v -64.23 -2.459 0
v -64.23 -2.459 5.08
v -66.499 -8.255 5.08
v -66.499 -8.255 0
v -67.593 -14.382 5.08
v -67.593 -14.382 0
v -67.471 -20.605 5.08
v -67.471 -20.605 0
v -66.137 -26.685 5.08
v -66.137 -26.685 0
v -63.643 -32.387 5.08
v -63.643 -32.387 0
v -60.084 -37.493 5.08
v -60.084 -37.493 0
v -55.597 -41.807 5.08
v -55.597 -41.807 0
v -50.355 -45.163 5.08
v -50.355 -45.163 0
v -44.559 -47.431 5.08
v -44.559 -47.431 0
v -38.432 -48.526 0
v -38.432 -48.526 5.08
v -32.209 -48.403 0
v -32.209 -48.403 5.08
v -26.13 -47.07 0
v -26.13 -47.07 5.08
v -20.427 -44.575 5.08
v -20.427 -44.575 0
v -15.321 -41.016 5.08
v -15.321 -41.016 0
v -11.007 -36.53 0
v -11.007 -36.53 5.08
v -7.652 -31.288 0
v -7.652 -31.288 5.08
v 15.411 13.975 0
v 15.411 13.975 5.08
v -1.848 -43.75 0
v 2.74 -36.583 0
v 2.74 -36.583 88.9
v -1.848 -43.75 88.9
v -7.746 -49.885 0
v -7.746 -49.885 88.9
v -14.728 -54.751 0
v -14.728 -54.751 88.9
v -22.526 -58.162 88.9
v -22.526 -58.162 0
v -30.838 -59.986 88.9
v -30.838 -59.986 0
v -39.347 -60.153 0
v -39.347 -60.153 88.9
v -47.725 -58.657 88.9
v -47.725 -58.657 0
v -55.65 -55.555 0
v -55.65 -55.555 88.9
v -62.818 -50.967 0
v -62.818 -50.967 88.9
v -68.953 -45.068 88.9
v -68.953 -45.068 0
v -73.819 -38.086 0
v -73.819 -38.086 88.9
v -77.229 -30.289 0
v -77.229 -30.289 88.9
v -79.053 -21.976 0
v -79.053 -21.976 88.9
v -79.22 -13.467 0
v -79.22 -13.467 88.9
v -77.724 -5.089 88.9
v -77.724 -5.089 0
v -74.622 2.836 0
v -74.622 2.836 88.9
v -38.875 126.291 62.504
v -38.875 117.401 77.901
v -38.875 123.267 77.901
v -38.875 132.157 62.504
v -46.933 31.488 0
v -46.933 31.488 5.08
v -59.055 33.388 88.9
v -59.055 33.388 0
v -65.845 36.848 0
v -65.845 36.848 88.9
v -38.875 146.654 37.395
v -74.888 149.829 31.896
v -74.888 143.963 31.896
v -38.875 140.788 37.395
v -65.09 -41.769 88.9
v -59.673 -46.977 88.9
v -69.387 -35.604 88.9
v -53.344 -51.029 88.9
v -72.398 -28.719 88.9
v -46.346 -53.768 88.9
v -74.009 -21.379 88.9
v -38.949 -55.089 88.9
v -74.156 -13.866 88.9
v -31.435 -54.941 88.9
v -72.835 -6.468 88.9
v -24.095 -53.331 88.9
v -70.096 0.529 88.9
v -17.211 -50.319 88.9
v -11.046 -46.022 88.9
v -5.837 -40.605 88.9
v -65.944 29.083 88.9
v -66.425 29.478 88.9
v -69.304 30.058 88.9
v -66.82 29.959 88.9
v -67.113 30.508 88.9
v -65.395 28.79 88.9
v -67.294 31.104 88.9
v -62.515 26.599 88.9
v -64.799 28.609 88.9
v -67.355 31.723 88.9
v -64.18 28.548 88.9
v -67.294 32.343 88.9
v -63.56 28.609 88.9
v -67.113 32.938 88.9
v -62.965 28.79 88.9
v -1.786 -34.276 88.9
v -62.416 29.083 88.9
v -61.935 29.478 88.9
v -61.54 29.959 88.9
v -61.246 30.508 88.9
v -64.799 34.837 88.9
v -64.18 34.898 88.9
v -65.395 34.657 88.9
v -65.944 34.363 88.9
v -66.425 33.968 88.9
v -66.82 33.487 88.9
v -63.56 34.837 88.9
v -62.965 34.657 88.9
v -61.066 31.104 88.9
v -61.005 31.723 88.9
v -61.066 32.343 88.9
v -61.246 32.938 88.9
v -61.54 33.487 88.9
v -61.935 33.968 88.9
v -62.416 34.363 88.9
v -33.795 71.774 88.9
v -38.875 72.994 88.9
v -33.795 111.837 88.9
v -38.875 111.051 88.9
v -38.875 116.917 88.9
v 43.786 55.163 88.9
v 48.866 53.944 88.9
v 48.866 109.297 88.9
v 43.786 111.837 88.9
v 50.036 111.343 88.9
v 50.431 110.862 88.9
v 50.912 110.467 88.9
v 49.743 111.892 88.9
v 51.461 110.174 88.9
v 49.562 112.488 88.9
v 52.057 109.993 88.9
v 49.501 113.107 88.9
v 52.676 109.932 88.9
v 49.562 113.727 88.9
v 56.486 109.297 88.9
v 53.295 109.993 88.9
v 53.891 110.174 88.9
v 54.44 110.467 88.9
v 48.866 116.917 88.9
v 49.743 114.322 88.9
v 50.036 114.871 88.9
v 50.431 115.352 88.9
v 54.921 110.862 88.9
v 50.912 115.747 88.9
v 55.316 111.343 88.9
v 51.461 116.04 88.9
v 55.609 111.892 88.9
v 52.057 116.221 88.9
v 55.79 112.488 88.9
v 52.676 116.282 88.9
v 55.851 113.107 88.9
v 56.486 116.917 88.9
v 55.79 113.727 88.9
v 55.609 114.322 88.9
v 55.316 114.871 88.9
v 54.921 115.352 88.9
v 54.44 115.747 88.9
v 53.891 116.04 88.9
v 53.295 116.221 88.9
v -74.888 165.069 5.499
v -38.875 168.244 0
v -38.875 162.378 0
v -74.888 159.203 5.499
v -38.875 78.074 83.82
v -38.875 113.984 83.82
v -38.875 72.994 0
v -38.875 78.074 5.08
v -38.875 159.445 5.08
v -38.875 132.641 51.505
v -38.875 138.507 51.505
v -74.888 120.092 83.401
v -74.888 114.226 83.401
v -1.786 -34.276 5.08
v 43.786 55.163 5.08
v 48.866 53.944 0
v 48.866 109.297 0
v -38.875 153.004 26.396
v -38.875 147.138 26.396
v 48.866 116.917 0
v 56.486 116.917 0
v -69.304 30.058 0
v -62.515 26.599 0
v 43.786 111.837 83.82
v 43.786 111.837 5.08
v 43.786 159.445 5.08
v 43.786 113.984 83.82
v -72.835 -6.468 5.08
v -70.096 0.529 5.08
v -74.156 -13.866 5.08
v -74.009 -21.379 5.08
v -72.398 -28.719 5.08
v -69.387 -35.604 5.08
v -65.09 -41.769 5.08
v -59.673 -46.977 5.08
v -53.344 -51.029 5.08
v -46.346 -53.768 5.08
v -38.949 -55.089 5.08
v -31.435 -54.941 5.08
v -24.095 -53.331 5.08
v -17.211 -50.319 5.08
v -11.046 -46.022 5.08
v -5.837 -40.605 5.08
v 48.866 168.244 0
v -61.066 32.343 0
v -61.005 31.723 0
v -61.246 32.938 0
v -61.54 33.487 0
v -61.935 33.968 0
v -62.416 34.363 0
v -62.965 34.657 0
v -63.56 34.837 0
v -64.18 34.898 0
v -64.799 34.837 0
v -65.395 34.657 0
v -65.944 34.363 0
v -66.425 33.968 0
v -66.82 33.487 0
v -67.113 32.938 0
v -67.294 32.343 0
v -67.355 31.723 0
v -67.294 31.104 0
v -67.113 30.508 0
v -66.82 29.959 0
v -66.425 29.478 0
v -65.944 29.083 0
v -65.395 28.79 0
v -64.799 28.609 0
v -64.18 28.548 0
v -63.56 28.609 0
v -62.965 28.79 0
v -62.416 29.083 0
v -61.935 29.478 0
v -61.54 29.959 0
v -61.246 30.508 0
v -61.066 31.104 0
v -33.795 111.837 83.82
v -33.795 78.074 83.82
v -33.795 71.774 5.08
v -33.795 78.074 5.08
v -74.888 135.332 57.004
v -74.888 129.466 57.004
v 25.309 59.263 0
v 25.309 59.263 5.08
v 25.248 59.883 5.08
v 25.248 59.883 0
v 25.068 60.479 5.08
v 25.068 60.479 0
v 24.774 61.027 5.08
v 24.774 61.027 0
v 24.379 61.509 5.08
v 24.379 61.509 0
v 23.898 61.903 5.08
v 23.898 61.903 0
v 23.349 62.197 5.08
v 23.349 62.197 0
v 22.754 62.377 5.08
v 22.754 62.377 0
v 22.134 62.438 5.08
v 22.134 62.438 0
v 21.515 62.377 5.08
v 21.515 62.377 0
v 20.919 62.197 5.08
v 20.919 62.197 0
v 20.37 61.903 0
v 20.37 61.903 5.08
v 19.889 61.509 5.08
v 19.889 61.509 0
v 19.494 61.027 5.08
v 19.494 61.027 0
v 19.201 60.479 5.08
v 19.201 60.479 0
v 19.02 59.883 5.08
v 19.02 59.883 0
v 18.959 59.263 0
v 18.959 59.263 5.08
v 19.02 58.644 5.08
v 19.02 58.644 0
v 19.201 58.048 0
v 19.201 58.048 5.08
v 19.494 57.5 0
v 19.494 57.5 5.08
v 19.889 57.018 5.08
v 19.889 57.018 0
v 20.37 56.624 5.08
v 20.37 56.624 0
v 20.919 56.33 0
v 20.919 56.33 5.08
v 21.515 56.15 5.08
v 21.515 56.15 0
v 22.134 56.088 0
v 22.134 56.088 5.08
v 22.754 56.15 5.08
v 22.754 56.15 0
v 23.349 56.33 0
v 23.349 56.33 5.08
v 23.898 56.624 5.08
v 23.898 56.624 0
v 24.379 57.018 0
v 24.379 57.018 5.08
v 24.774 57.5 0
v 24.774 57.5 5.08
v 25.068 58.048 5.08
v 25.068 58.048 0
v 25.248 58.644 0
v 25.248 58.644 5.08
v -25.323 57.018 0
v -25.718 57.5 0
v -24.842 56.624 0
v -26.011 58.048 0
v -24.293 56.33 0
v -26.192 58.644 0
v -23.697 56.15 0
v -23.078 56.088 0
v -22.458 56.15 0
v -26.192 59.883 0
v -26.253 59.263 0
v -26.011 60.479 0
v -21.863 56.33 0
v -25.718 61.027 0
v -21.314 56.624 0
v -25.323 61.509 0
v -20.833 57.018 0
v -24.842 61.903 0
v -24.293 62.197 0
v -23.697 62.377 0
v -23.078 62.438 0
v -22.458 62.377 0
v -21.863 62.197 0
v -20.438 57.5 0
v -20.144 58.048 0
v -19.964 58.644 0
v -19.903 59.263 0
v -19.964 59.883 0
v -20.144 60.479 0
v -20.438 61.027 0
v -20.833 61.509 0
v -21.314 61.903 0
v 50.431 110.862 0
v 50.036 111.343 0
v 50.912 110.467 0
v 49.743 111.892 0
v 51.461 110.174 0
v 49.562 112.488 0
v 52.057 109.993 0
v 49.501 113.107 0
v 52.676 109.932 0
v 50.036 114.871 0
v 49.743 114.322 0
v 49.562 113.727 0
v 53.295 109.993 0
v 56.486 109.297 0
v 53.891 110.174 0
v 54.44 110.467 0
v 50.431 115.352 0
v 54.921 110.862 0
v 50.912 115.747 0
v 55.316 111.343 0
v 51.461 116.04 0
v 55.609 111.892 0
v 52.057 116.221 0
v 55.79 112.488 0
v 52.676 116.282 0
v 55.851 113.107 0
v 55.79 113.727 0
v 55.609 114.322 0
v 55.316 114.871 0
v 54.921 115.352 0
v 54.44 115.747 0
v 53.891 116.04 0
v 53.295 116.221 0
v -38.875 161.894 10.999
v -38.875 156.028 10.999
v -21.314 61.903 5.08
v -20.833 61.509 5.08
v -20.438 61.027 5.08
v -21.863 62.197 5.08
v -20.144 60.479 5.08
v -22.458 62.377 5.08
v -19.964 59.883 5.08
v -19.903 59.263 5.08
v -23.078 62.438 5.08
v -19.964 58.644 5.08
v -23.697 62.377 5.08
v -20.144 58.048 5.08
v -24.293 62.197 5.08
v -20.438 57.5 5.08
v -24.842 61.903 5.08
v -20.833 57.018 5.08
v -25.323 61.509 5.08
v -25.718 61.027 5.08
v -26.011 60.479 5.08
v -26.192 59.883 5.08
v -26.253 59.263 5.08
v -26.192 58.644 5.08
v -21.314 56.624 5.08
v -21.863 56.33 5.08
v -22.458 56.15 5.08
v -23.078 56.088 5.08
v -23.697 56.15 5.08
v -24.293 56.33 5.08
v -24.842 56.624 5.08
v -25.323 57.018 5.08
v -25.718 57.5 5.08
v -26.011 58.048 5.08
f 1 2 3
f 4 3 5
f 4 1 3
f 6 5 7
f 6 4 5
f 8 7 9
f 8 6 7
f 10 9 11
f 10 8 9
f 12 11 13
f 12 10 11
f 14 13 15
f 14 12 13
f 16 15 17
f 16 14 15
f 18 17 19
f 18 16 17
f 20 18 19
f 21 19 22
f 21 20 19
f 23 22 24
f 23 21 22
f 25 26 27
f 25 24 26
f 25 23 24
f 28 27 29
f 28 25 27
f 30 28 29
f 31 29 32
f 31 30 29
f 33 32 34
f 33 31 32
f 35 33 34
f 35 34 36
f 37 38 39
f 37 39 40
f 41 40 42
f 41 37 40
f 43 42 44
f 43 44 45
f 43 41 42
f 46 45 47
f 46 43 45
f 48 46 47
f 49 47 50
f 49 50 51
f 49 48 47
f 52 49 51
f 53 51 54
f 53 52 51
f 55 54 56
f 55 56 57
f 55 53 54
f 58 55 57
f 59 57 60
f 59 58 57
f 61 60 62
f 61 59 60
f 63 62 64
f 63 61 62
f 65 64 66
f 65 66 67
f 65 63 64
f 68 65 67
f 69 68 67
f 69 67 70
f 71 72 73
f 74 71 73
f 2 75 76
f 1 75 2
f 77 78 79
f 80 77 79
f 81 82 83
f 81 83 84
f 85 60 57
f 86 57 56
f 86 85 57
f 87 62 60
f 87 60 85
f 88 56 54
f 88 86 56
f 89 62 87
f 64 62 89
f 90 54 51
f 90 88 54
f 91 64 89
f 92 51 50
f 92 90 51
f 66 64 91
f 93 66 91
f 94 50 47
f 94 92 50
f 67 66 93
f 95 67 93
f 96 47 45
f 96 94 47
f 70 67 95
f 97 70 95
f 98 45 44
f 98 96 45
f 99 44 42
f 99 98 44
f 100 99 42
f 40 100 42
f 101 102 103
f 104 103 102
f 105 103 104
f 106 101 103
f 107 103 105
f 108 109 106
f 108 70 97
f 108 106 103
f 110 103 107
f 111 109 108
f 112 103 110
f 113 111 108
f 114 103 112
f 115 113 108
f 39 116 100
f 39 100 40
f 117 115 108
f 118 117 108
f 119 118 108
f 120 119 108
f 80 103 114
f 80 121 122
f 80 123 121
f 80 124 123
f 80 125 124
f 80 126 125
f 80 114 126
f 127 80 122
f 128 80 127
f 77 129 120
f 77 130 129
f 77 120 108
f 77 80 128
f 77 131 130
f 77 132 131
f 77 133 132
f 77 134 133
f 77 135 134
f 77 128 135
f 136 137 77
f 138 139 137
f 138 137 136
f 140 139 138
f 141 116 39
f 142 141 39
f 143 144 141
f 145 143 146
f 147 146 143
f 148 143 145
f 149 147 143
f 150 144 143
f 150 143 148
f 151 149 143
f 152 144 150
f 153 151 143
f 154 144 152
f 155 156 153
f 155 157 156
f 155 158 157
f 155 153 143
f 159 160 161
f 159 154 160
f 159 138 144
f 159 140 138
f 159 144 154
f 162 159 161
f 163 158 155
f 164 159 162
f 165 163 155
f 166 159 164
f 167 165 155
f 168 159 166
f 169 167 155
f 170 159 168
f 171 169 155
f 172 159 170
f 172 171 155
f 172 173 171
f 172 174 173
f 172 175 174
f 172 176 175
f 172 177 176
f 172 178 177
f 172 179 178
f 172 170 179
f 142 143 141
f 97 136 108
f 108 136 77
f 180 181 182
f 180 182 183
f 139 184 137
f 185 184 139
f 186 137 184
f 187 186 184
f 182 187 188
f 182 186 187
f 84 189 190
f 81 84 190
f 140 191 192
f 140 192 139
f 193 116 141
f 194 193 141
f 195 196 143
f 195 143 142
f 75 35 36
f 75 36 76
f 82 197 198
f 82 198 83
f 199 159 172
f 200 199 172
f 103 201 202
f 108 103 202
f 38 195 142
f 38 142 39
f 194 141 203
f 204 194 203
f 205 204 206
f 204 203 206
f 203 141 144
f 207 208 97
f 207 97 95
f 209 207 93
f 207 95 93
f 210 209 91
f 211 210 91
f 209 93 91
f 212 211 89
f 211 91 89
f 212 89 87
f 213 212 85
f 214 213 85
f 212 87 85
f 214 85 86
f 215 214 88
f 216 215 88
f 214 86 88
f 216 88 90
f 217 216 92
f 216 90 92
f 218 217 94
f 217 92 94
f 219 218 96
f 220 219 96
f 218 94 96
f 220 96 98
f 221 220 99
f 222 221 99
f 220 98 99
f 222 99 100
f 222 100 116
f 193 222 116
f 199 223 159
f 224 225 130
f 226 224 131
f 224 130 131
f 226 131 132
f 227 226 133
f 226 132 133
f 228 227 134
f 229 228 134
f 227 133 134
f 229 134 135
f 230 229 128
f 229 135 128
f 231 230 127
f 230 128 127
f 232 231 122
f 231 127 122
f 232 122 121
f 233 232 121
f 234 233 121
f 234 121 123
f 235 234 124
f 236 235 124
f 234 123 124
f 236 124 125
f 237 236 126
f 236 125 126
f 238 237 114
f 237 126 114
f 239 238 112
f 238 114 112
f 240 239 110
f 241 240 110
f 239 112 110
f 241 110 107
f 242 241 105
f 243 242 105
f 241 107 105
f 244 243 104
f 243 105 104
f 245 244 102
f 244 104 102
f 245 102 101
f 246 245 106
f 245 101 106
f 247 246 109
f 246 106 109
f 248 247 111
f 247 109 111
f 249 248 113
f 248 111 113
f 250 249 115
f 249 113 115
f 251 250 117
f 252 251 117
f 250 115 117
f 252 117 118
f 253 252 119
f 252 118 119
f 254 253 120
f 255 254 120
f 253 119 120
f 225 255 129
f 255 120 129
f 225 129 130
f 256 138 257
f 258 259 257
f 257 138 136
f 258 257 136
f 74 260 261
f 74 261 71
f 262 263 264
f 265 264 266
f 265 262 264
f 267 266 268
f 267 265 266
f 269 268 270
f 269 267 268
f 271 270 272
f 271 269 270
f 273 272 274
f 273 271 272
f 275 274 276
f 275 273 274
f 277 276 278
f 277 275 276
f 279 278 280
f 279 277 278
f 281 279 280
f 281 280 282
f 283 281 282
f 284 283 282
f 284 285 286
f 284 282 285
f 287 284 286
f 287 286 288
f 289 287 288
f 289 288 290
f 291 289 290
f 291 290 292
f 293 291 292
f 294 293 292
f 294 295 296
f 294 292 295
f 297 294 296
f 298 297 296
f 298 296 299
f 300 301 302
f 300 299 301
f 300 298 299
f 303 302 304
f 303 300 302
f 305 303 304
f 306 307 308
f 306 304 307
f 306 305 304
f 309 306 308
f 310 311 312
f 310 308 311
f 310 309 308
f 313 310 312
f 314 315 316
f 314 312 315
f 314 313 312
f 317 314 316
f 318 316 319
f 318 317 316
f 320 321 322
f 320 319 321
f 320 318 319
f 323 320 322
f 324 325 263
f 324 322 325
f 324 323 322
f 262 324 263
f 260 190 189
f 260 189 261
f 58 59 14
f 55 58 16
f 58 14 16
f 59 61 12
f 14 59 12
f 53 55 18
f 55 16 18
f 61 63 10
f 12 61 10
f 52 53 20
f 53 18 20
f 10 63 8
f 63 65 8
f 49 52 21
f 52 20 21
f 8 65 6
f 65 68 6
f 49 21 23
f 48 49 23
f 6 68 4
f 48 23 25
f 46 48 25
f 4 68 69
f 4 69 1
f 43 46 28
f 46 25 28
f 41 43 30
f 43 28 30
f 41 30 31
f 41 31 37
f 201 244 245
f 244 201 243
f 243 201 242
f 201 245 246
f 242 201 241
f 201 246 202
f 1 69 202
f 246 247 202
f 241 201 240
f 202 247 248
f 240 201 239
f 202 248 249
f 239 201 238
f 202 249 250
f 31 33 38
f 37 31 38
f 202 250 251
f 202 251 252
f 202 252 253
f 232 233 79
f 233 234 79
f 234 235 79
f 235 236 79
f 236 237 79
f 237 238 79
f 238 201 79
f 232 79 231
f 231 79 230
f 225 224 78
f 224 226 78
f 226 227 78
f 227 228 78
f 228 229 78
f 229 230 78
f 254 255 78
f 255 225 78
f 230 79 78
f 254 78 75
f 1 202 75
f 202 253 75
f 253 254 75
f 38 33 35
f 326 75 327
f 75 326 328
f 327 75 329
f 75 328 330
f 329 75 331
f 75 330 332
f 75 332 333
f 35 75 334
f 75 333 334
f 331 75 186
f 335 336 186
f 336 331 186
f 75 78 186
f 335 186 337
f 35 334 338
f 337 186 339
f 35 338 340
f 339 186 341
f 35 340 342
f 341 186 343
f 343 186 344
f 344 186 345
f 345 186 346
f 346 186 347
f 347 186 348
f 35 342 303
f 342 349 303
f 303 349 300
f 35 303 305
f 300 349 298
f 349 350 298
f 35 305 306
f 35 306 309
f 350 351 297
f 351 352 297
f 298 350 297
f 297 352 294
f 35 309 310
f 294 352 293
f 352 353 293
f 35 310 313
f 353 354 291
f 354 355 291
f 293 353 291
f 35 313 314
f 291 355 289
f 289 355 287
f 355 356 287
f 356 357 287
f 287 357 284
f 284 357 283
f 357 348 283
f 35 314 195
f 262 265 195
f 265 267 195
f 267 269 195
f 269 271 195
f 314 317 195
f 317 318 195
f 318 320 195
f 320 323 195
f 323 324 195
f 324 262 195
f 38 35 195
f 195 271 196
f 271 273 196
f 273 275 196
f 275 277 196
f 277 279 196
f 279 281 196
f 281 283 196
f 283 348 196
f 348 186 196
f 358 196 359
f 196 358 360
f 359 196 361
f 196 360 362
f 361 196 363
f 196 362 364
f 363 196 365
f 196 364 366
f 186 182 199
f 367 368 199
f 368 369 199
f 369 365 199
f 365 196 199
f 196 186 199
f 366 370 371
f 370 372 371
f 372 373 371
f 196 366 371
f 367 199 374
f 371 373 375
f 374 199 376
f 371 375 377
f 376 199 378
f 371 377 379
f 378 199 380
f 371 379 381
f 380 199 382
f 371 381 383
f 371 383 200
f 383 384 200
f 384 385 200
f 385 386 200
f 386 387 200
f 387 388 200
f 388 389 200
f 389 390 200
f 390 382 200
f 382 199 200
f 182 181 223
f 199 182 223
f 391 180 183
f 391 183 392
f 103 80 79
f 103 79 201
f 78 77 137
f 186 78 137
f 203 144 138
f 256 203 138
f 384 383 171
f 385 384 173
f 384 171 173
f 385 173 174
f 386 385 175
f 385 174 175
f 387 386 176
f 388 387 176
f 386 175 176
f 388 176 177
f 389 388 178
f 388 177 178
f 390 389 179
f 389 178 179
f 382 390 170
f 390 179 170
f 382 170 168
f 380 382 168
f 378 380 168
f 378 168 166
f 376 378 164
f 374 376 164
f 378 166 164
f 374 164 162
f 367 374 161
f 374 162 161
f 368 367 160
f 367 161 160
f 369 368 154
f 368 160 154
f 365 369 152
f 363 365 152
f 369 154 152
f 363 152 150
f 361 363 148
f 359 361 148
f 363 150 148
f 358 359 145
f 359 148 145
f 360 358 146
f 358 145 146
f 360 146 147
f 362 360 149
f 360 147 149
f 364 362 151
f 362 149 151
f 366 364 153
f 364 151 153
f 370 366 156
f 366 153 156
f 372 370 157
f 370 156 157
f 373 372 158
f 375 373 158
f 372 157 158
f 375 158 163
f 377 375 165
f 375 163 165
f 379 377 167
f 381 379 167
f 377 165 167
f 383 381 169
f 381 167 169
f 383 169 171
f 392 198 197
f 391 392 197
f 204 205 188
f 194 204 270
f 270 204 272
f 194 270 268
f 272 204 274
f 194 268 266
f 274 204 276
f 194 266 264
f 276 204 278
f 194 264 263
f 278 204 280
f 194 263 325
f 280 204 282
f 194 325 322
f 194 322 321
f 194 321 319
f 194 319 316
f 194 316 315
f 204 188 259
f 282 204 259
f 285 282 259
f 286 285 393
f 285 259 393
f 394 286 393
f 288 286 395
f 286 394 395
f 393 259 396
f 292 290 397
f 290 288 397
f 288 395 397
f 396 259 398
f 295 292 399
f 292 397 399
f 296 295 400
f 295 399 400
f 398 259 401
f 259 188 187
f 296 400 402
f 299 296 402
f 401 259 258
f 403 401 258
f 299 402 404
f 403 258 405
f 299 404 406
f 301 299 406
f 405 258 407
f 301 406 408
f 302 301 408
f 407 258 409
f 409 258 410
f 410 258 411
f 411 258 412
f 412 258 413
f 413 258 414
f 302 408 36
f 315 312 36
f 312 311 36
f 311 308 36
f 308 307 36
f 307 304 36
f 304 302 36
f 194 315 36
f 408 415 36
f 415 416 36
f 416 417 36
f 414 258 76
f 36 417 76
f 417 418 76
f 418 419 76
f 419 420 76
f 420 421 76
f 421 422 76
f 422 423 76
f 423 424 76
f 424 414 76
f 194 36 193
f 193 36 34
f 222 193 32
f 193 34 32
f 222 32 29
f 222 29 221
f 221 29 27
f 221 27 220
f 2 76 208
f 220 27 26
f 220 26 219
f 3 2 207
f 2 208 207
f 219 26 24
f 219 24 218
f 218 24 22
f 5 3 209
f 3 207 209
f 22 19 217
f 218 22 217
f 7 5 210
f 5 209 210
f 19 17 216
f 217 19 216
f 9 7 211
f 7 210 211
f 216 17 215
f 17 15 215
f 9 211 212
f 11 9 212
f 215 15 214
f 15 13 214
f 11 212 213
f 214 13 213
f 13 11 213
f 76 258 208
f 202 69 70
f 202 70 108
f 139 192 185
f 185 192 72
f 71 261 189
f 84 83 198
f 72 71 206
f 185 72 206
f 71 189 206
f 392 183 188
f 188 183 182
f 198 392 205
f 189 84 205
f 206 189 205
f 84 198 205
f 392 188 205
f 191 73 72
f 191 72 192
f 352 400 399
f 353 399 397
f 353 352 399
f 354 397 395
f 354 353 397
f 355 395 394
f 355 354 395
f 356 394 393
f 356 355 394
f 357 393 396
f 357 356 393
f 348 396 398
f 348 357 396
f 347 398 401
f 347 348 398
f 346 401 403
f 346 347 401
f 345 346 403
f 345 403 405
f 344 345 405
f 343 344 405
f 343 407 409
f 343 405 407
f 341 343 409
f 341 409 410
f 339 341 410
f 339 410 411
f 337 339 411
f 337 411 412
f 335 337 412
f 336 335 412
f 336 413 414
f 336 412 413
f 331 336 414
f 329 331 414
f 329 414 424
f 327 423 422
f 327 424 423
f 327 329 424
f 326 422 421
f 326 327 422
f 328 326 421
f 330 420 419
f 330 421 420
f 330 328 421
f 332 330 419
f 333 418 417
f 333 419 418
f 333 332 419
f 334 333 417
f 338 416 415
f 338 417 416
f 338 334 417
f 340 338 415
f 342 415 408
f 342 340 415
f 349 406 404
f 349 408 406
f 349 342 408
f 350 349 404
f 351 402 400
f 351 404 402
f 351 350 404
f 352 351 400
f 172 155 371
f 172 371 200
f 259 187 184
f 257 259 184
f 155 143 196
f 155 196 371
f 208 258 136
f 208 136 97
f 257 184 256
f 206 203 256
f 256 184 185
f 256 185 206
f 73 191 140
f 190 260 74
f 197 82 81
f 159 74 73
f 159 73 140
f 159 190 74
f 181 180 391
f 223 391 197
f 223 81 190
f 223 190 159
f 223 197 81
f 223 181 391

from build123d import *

# Parameters (mm, degrees)
SKETCH1_R           = 3.175
BOSS_EXTRUDE1_DEPTH = 88.9
CUT_EXTRUDE1_DEPTH  = 210.541455785
CUT_EXTRUDE2_DEPTH  = 83.82
CUT_EXTRUDE3_DEPTH  = 82.661206718
BOSS_EXTRUDE2_DEPTH = 5.865878735
SKETCH6_W           = 7.62
SKETCH6_H           = 7.62
SKETCH6_R           = 3.175
BOSS_EXTRUDE3_DEPTH = 88.9


with BuildPart() as part:
    # Sketch1 → Boss-Extrude1 (new body)
    with BuildSketch(Plane.XY):
        with BuildLine():
            Line((-38.875279998, 168.243550653), (48.865926721, 168.243550653))
            Line((48.865926721, 168.243550653), (48.865926721, 53.943550653))
            Line((48.865926721, 53.943550653), (2.740491947, -36.582712205))
            ThreePointArc((2.740491947, -36.582712205), (-55.650204571, -55.55499958), (-74.622491947, 2.835696938))
            Line((-74.622491947, 2.835696938), (-38.875279998, 72.993550653))
            Line((-38.875279998, 72.993550653), (-38.875279998, 168.243550653))
        make_face()
        with Locations((-23.07761236, 59.263499889)):
            Circle(SKETCH1_R, mode=Mode.SUBTRACT)
        with Locations((22.13438764, 59.263499889)):
            Circle(SKETCH1_R, mode=Mode.SUBTRACT)
        with BuildLine():
            Line((-7.651542857, -31.287706), (15.41117453, 13.975425429))
            Line((15.41117453, 13.975425429), (-46.933419103, 31.488039305))
            Line((-46.933419103, 31.488039305), (-64.230457143, -2.459309266))
            ThreePointArc((-64.230457143, -2.459309266), (-50.355198367, -45.162964776), (-7.651542857, -31.287706))
        make_face(mode=Mode.SUBTRACT)
    extrude(amount=BOSS_EXTRUDE1_DEPTH)

    # Sketch2 → Cut-Extrude1 (cut, through all)
    with BuildSketch(Plane.ZY.offset(38.875279998)):
        Polygon((0, 168.243550653), (88.9, 116.917111722), (88.9, 168.243550653), align=None)
    extrude(amount=-CUT_EXTRUDE1_DEPTH, mode=Mode.SUBTRACT)

    # Sketch3 → Cut-Extrude2 (cut)
    with BuildSketch(Plane.XY.offset(88.9)):
        with BuildLine():
            Line((43.785926721, 111.837111722), (-33.795279998, 111.837111722))
            Line((-33.795279998, 111.837111722), (-33.795279998, 71.773950557))
            Line((-33.795279998, 71.773950557), (-70.096178804, 0.5294252))
            ThreePointArc((-70.096178804, 0.5294252), (-53.343932833, -51.028686437), (-1.785821196, -34.276440466))
            Line((-1.785821196, -34.276440466), (43.785926721, 55.163150749))
            Line((43.785926721, 55.163150749), (43.785926721, 111.837111722))
        make_face()
    extrude(amount=-CUT_EXTRUDE2_DEPTH, mode=Mode.SUBTRACT)

    # Sketch4 → Cut-Extrude3 (cut)
    with BuildSketch(Plane.ZY.offset(38.875279998)):
        Polygon((83.82, 78.073550653), (83.82, 113.984172354), (5.08, 159.44473255), (5.08, 78.073550653), align=None)
    extrude(amount=-CUT_EXTRUDE3_DEPTH, mode=Mode.SUBTRACT)

    # Sketch5 → Boss-Extrude2 (add, along a direction that is not the sketch's normal)
    with BuildSketch(Plane(origin=(0, 126.18266299, 72.851594444), x_dir=(1, 0, 0), z_dir=(0, 0.8660254037844417, 0.4999999999999947))):
        Polygon((-38.875279998, 84.121775326), (-74.887919552, 77.771775326), (-38.875279998, 71.421775326), align=None)
        Polygon((-38.875279998, 53.641775326), (-74.887919552, 47.291775326), (-38.875279998, 40.941775326), align=None)
        Polygon((-38.875279998, 24.648897465), (-74.887919552, 18.298897465), (-38.875279998, 11.948897465), align=None)
        Polygon((-38.875279998, -5.831102535), (-74.887919552, -12.181102535), (-38.875279998, -18.531102535), align=None)
    extrude(amount=-BOSS_EXTRUDE2_DEPTH, dir=(0, 1, 0))

    # Sketch6 → Boss-Extrude3 (add)
    # profile 1 of 2: a face of its own
    with BuildSketch(Plane.XY.offset(88.9)):
        with Locations((52.675926721, 113.107111722)):
            Rectangle(SKETCH6_W, SKETCH6_H)
        with Locations((52.675926721, 113.107111722)):
            Circle(SKETCH6_R, mode=Mode.SUBTRACT)
    # profile 2 of 2: a face of its own
    with BuildSketch(Plane.XY.offset(88.9)):
        Polygon((-62.514565319, 26.598840938), (-59.055157711, 33.388310653), (-65.844627425, 36.847718261), (-69.304035033, 30.058248546), align=None)
        with Locations((-64.179596372, 31.7232796)):
            Circle(SKETCH6_R, mode=Mode.SUBTRACT)
    extrude(amount=-BOSS_EXTRUDE3_DEPTH)


solid = part.part
